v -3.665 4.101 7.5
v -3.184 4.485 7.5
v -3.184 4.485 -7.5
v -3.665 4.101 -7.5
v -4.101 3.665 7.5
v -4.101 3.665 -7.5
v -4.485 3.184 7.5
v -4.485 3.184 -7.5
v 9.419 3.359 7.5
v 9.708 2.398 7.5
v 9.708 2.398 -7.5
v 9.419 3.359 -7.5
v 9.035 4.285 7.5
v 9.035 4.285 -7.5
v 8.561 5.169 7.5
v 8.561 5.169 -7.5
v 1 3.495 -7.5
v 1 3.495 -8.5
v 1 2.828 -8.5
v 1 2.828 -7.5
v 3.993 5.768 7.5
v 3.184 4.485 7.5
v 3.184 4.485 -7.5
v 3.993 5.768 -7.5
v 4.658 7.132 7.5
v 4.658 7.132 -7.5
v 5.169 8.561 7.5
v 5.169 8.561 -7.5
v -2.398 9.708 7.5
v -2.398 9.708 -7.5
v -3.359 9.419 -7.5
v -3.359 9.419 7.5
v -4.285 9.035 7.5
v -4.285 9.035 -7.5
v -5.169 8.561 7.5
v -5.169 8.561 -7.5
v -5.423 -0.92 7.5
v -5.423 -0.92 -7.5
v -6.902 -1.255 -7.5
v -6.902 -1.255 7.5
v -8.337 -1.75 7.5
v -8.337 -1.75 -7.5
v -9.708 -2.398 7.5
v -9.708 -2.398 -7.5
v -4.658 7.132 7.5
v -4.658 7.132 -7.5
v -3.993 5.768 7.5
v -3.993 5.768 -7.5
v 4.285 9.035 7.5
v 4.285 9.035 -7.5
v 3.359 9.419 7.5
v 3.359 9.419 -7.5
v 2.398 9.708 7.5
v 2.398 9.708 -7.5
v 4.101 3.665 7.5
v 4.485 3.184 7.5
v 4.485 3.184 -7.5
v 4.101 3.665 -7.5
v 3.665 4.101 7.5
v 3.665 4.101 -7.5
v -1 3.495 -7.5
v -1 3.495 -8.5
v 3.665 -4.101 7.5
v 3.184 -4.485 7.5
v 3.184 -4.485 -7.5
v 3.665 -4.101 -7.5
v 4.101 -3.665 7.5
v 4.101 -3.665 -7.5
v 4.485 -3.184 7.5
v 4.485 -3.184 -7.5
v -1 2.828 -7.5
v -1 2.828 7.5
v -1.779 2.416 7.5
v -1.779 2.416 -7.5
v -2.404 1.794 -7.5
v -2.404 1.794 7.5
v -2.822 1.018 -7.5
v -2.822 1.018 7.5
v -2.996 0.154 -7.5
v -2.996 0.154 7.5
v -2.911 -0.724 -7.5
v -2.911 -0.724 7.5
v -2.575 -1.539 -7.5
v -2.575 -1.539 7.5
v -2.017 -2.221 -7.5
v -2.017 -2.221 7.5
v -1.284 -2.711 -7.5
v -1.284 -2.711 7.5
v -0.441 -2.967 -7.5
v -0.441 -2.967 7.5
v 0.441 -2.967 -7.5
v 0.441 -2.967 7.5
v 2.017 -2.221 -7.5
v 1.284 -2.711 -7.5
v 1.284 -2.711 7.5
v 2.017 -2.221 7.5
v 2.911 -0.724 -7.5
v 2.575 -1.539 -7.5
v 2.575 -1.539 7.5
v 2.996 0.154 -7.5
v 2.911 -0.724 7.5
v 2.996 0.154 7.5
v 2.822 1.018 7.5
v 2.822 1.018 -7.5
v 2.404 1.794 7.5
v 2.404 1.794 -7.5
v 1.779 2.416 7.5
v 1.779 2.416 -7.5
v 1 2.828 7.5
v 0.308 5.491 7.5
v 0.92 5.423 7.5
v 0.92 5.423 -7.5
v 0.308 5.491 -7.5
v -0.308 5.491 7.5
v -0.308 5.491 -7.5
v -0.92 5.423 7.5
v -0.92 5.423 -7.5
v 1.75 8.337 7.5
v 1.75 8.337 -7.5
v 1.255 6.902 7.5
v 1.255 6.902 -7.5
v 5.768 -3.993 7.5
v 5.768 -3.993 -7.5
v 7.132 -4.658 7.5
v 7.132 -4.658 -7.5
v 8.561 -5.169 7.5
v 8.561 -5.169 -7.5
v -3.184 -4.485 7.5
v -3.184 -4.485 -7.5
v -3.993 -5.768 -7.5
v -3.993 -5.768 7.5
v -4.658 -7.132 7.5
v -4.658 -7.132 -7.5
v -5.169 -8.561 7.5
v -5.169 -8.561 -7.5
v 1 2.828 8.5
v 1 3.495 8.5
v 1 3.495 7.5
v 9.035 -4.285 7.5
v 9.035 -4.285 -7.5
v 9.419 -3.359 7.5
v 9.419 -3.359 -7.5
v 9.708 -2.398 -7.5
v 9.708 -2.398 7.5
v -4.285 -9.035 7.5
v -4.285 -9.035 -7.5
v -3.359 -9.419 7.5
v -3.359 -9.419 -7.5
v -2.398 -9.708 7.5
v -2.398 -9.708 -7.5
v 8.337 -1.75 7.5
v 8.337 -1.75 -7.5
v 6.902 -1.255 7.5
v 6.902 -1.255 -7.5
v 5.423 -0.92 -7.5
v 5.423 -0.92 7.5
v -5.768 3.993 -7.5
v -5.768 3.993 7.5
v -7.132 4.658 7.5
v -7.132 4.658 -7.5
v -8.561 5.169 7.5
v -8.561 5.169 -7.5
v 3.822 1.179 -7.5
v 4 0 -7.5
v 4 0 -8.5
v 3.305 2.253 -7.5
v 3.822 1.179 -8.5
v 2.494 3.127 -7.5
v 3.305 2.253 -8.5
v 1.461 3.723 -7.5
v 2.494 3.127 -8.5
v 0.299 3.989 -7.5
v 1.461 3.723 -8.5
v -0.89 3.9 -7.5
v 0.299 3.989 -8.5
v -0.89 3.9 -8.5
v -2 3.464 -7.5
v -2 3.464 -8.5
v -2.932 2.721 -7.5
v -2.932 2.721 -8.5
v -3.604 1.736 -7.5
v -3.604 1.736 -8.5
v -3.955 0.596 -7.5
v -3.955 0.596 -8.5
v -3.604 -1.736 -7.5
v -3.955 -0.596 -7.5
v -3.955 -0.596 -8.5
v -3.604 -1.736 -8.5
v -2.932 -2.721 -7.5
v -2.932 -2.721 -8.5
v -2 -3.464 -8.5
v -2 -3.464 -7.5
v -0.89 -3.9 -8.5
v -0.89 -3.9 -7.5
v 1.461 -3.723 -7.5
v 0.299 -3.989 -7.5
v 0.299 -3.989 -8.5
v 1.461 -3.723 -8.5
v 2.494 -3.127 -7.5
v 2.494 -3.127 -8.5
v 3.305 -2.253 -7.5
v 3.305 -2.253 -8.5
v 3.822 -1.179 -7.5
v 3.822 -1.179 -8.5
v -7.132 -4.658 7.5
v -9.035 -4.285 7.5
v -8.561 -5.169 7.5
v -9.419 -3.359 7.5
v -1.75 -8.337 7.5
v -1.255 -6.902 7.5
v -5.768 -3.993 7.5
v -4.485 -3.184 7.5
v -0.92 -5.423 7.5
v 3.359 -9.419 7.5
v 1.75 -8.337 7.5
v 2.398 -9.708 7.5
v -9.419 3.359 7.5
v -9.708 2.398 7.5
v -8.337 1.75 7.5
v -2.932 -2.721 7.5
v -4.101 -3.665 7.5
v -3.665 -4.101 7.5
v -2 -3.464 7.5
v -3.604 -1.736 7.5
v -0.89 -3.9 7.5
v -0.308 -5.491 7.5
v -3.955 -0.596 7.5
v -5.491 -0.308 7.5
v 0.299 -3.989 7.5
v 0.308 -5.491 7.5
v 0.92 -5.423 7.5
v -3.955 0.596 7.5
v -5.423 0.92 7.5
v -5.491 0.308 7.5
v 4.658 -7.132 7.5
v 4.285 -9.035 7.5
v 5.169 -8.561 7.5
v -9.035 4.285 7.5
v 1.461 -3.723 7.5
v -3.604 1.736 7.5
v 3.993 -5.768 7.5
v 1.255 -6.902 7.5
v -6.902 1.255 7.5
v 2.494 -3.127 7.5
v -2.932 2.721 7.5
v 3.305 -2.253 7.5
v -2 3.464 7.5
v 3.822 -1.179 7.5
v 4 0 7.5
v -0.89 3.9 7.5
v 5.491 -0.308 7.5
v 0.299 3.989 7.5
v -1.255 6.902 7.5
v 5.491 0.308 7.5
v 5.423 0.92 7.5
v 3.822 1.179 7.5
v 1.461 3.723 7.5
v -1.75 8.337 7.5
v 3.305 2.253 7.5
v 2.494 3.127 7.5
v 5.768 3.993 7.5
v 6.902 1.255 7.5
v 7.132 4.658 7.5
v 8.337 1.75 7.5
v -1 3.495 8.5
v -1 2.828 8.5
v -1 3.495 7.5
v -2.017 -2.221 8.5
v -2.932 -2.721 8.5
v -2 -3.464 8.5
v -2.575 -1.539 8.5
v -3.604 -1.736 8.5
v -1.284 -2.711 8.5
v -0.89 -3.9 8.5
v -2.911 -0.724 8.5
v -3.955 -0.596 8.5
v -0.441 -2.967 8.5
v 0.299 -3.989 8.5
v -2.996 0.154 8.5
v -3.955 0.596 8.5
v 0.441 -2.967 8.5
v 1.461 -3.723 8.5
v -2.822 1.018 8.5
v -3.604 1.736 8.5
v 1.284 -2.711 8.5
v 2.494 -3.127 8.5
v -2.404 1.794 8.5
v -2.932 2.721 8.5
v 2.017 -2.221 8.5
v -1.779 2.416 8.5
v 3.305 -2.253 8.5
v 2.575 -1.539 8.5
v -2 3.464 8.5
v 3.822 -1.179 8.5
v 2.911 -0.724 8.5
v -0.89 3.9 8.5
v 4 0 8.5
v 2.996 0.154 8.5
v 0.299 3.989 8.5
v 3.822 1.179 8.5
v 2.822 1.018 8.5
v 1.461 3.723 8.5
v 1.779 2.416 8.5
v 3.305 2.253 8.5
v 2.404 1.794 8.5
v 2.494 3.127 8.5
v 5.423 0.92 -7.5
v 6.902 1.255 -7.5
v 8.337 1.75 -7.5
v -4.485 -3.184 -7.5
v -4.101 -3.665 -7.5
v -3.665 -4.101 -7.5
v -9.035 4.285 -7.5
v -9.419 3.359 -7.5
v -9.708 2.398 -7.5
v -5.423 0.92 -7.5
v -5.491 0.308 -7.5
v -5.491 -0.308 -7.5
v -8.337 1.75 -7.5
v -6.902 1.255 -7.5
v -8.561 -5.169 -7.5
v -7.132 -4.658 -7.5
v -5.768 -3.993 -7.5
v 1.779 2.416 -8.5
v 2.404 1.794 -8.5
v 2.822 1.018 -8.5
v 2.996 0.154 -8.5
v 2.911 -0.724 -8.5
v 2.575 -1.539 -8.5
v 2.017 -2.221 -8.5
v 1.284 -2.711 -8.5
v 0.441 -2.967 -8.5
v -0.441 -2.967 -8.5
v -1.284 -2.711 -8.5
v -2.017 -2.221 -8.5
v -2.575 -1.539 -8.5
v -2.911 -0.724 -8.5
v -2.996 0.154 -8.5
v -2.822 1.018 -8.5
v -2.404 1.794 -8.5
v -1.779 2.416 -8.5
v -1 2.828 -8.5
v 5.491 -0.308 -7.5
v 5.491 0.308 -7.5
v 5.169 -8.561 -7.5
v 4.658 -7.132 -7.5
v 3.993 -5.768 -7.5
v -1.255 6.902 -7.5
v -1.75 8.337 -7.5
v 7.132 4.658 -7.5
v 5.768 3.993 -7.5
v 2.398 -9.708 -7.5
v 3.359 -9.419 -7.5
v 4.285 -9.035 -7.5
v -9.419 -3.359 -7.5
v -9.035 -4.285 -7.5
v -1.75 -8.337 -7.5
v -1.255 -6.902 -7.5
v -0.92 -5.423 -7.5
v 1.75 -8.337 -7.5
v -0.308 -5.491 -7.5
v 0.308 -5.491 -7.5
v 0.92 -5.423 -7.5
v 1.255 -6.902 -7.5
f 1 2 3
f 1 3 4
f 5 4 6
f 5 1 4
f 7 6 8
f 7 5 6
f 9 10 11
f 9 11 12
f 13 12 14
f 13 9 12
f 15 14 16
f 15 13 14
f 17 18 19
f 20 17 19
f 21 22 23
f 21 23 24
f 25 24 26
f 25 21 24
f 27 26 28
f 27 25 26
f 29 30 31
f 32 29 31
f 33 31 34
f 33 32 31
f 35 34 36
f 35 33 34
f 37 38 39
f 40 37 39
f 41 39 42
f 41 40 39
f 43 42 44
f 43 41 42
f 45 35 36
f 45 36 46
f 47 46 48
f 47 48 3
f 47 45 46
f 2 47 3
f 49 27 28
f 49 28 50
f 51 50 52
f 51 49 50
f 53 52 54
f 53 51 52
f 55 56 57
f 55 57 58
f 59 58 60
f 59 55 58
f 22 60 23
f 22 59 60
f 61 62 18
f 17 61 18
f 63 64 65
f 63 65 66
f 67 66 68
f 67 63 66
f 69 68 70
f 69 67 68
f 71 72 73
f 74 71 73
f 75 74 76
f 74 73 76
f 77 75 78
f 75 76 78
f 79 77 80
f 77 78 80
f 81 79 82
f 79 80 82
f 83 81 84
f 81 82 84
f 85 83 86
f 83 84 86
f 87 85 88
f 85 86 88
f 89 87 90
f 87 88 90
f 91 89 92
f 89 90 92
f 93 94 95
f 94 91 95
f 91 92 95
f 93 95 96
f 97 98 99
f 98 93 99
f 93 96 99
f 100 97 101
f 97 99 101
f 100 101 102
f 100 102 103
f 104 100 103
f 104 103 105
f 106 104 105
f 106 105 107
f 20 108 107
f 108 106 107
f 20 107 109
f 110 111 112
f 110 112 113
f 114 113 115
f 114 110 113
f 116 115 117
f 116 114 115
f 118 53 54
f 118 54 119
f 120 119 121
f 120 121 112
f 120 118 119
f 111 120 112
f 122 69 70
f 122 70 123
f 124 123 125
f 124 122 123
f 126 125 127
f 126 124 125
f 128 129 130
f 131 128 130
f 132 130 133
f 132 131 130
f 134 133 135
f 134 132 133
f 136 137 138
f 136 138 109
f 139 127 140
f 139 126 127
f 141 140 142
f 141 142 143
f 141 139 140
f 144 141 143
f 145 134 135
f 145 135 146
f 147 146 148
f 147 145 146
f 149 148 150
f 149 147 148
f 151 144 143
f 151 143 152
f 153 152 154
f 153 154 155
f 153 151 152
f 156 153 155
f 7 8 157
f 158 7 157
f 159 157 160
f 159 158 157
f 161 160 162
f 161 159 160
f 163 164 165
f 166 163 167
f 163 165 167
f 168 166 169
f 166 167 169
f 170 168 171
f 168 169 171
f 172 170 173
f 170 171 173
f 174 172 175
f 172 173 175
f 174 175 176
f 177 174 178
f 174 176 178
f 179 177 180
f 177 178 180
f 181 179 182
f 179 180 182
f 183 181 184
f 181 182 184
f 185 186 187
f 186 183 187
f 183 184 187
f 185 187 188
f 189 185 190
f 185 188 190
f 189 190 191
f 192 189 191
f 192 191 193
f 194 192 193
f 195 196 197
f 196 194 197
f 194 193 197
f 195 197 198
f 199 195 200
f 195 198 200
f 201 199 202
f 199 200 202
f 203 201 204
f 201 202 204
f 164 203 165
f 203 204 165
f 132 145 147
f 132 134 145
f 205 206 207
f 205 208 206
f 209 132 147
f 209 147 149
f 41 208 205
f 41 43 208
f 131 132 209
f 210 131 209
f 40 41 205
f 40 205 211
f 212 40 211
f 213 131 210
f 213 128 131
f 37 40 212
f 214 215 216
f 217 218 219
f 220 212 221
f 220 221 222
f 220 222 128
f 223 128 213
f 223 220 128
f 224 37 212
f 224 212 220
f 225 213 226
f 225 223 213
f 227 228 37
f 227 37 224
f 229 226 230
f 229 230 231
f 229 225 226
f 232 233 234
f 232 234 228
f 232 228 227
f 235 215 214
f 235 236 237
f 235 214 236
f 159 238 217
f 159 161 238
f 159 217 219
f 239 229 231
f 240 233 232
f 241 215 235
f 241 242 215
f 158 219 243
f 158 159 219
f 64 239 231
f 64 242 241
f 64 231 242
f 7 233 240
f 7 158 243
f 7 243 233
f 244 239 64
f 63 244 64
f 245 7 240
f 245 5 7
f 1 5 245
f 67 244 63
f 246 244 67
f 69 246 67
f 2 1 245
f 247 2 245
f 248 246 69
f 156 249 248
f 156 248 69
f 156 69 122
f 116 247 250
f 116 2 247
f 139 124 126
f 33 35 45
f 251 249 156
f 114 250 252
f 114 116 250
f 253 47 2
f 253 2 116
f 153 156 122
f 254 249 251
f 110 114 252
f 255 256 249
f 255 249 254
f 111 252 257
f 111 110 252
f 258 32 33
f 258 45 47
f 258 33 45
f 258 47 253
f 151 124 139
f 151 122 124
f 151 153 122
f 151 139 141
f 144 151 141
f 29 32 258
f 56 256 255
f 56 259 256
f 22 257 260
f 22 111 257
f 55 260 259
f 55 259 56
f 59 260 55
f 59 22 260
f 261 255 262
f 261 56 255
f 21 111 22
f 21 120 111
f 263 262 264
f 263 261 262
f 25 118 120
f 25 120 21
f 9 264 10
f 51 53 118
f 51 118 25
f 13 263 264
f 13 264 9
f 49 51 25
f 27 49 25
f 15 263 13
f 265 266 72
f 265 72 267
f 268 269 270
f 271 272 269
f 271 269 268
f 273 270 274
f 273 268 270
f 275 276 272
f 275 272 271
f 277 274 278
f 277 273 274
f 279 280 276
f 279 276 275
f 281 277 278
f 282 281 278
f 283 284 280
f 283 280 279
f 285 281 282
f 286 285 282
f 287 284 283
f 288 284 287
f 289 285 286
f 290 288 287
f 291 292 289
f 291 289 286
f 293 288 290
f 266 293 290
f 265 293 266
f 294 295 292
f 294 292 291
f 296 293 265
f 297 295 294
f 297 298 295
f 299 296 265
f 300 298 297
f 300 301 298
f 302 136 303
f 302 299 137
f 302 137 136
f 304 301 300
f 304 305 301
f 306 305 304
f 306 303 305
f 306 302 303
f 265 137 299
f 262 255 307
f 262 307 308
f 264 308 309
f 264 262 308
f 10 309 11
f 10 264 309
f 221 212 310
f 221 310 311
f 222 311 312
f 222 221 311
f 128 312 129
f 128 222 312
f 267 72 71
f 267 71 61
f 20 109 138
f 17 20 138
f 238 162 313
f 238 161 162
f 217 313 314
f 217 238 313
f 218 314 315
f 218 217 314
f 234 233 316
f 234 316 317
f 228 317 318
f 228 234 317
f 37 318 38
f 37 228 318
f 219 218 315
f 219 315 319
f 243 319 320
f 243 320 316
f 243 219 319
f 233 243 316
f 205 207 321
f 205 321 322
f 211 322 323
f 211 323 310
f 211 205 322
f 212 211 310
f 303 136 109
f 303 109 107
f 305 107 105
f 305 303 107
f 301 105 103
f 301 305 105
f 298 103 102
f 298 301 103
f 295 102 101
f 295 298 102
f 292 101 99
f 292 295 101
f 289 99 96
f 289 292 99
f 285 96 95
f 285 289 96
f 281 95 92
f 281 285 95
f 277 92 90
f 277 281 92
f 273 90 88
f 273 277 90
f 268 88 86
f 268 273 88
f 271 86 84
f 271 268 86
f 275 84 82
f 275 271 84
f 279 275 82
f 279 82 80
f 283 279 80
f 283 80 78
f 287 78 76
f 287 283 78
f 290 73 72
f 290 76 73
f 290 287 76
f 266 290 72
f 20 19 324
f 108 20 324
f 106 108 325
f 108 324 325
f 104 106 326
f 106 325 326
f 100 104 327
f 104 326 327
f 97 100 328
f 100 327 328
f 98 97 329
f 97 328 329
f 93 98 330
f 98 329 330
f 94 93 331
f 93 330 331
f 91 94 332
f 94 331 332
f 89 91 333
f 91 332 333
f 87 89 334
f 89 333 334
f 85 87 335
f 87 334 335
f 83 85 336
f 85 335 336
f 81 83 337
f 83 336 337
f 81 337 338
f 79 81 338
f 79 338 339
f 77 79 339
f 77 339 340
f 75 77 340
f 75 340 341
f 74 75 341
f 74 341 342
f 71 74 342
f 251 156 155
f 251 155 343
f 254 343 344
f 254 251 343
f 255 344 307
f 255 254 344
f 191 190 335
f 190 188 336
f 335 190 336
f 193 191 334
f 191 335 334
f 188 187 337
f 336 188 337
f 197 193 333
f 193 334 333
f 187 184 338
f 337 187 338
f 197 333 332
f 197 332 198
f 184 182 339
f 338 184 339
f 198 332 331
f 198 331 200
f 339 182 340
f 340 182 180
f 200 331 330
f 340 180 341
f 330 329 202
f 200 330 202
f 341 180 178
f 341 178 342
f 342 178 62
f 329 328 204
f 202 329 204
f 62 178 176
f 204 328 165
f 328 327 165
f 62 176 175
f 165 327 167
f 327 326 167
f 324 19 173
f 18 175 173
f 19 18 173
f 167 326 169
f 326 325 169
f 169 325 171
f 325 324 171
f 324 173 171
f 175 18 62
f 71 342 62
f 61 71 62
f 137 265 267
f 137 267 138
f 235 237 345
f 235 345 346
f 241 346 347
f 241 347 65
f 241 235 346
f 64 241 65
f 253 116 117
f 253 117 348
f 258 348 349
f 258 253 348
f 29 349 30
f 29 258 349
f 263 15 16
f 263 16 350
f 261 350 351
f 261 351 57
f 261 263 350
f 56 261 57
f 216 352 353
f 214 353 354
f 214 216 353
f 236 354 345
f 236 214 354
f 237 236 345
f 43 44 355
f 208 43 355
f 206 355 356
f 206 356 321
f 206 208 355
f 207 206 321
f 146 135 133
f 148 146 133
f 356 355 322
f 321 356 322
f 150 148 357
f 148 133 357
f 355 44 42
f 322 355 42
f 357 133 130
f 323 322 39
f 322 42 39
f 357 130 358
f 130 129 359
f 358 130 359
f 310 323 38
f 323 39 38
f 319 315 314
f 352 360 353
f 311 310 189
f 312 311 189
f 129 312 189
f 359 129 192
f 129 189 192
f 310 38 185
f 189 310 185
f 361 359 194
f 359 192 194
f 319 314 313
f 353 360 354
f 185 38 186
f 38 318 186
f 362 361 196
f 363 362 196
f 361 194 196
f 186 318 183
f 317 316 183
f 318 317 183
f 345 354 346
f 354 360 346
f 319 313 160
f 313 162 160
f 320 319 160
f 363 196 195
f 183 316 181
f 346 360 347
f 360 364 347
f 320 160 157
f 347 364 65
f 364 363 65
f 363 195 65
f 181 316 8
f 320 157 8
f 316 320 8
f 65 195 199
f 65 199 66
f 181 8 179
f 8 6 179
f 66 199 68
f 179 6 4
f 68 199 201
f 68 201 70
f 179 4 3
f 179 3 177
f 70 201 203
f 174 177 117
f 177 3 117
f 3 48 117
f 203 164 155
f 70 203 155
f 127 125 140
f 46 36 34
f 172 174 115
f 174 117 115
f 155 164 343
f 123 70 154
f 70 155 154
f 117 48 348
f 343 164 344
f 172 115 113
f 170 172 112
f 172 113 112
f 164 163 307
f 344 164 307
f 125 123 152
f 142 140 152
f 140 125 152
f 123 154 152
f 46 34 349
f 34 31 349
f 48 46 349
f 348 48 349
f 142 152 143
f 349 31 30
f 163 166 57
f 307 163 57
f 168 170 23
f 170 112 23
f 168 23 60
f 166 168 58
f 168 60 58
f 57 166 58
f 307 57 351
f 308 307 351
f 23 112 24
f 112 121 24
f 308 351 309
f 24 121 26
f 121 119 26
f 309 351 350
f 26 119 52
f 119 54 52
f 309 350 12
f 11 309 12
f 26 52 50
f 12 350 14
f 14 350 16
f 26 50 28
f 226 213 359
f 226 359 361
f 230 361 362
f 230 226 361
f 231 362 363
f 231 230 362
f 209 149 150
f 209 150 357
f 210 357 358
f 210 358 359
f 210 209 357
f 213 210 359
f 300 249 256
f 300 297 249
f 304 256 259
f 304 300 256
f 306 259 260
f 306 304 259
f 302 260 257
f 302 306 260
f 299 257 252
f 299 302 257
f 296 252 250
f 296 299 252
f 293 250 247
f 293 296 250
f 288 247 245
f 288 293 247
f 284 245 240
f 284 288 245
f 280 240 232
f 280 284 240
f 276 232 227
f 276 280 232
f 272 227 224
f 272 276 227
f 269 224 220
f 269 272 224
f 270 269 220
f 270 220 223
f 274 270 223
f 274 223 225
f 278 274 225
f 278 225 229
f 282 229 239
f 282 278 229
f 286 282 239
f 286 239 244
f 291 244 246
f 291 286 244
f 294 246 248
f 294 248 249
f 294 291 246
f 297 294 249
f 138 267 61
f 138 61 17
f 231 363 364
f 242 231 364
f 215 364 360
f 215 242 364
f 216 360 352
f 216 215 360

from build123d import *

# Parameters (mm, degrees)
SKETCH1_R               = 10
BOSS_EXTRUDE1_DEPTH     = 7.5
CUT_EXTRUDE1_DEPTH      = 8.5
SKETCH3_R               = 4
BOSS_EXTRUDE2_DEPTH     = 1
SKETCH3_3_W             = 2
SKETCH3_3_H             = 1.333333333
CUT_EXTRUDE2_DEPTH      = 2
CUT_EXTRUDE2_DEPTH_BACK = 17
CIRPATTERN2_COUNT       = 8


with BuildPart() as part:
    # Sketch1 → Boss-Extrude1 (new body, symmetric)
    with BuildSketch(Plane.XY):
        Circle(SKETCH1_R)
    extrude(amount=BOSS_EXTRUDE1_DEPTH, both=True)

    # Sketch2 → Cut-Extrude1 (cut, symmetric)
    with BuildSketch(Plane.XY):
        with BuildLine():
            ThreePointArc((0.919743931, 5.422552084), (0, 5.5), (-0.919743931, 5.422552084))
            ThreePointArc((-0.919743931, 5.422552084), (-1.482705591, 7.626183267), (-2.398327114, 9.708142307))
            ThreePointArc((-2.398327114, 9.708142307), (0, 10), (2.398327114, 9.708142307))
            ThreePointArc((2.398327114, 9.708142307), (1.482705591, 7.626183267), (0.919743931, 5.422552084))
        make_face()
    cut_extrude1 = extrude(amount=CUT_EXTRUDE1_DEPTH, both=True, mode=Mode.SUBTRACT)

    # Sketch3 → Boss-Extrude2 (add, symmetric)
    with BuildSketch(Plane.XY.offset(7.5)):
        Circle(SKETCH3_R)
        with BuildLine():
            Line((-1, 2.828427125), (-1, 3.495093791))
            Line((-1, 3.495093791), (1, 3.495093791))
            Line((1, 3.495093791), (1, 2.828427125))
            ThreePointArc((1, 2.828427125), (0, -3), (-1, 2.828427125))
        make_face(mode=Mode.SUBTRACT)
    boss_extrude2 = extrude(amount=BOSS_EXTRUDE2_DEPTH, both=True)

    # Mirror1: Boss-Extrude2 across plane
    add(boss_extrude2.mirror(Plane.XY))

    # Sketch3<3> → Cut-Extrude2 (cut, two sides)
    with BuildSketch(Plane.XY.offset(7.5)) as cut_extrude2_sk:
        with BuildLine():
            Line((-1, 2.161760458), (-1, 2.828427125))
            ThreePointArc((-1, 2.828427125), (0, -3), (1, 2.828427125))
            Line((1, 2.828427125), (1, 2.161760458))
            Line((1, 2.161760458), (-1, 2.161760458))
        make_face()
        with Locations((0, 2.828427125)):
            Rectangle(SKETCH3_3_W, SKETCH3_3_H)
    extrude(amount=CUT_EXTRUDE2_DEPTH, mode=Mode.SUBTRACT)
    extrude(cut_extrude2_sk.sketch, amount=-CUT_EXTRUDE2_DEPTH_BACK, mode=Mode.SUBTRACT)

    # CirPattern2: Cut-Extrude1 ×8 about axis
    cirpattern2_axis = Axis((0, 0, 0), (0, 0, 1))
    for i in range(1, CIRPATTERN2_COUNT):
        add(cut_extrude1.rotate(cirpattern2_axis, i * 360 / CIRPATTERN2_COUNT), mode=Mode.SUBTRACT)


solid = part.part
